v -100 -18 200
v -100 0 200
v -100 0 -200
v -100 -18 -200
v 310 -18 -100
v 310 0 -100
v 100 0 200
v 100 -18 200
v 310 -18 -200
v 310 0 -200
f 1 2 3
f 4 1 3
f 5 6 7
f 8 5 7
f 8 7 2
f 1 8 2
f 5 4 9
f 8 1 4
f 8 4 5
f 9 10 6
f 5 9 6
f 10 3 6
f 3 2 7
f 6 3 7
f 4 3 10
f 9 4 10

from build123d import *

# Parameters (mm, degrees)
F1_DEPTH = 18


# Not quite as in the source:
# - a feature names something its author has since deleted; it is built from what else it names


with BuildPart() as f1:
    # F0 (on Front) → F1 (new body)
    with BuildSketch(Plane.XZ):
        Polygon((310, -100), (100, 200), (100, -100), align=None)
        Polygon((-100, 200), (-100, -200), (100, -200), (310, -200), (310, -100), (100, -100), (100, 200), align=None)
    extrude(amount=F1_DEPTH)


solid = f1.part
